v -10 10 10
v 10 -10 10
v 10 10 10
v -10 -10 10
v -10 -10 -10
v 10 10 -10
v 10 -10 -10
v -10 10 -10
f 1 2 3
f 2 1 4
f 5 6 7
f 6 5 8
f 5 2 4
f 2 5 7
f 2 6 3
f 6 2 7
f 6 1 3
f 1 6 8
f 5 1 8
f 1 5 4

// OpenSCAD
// Simple cube without dependencies
cube([20, 20, 20], center=true);
